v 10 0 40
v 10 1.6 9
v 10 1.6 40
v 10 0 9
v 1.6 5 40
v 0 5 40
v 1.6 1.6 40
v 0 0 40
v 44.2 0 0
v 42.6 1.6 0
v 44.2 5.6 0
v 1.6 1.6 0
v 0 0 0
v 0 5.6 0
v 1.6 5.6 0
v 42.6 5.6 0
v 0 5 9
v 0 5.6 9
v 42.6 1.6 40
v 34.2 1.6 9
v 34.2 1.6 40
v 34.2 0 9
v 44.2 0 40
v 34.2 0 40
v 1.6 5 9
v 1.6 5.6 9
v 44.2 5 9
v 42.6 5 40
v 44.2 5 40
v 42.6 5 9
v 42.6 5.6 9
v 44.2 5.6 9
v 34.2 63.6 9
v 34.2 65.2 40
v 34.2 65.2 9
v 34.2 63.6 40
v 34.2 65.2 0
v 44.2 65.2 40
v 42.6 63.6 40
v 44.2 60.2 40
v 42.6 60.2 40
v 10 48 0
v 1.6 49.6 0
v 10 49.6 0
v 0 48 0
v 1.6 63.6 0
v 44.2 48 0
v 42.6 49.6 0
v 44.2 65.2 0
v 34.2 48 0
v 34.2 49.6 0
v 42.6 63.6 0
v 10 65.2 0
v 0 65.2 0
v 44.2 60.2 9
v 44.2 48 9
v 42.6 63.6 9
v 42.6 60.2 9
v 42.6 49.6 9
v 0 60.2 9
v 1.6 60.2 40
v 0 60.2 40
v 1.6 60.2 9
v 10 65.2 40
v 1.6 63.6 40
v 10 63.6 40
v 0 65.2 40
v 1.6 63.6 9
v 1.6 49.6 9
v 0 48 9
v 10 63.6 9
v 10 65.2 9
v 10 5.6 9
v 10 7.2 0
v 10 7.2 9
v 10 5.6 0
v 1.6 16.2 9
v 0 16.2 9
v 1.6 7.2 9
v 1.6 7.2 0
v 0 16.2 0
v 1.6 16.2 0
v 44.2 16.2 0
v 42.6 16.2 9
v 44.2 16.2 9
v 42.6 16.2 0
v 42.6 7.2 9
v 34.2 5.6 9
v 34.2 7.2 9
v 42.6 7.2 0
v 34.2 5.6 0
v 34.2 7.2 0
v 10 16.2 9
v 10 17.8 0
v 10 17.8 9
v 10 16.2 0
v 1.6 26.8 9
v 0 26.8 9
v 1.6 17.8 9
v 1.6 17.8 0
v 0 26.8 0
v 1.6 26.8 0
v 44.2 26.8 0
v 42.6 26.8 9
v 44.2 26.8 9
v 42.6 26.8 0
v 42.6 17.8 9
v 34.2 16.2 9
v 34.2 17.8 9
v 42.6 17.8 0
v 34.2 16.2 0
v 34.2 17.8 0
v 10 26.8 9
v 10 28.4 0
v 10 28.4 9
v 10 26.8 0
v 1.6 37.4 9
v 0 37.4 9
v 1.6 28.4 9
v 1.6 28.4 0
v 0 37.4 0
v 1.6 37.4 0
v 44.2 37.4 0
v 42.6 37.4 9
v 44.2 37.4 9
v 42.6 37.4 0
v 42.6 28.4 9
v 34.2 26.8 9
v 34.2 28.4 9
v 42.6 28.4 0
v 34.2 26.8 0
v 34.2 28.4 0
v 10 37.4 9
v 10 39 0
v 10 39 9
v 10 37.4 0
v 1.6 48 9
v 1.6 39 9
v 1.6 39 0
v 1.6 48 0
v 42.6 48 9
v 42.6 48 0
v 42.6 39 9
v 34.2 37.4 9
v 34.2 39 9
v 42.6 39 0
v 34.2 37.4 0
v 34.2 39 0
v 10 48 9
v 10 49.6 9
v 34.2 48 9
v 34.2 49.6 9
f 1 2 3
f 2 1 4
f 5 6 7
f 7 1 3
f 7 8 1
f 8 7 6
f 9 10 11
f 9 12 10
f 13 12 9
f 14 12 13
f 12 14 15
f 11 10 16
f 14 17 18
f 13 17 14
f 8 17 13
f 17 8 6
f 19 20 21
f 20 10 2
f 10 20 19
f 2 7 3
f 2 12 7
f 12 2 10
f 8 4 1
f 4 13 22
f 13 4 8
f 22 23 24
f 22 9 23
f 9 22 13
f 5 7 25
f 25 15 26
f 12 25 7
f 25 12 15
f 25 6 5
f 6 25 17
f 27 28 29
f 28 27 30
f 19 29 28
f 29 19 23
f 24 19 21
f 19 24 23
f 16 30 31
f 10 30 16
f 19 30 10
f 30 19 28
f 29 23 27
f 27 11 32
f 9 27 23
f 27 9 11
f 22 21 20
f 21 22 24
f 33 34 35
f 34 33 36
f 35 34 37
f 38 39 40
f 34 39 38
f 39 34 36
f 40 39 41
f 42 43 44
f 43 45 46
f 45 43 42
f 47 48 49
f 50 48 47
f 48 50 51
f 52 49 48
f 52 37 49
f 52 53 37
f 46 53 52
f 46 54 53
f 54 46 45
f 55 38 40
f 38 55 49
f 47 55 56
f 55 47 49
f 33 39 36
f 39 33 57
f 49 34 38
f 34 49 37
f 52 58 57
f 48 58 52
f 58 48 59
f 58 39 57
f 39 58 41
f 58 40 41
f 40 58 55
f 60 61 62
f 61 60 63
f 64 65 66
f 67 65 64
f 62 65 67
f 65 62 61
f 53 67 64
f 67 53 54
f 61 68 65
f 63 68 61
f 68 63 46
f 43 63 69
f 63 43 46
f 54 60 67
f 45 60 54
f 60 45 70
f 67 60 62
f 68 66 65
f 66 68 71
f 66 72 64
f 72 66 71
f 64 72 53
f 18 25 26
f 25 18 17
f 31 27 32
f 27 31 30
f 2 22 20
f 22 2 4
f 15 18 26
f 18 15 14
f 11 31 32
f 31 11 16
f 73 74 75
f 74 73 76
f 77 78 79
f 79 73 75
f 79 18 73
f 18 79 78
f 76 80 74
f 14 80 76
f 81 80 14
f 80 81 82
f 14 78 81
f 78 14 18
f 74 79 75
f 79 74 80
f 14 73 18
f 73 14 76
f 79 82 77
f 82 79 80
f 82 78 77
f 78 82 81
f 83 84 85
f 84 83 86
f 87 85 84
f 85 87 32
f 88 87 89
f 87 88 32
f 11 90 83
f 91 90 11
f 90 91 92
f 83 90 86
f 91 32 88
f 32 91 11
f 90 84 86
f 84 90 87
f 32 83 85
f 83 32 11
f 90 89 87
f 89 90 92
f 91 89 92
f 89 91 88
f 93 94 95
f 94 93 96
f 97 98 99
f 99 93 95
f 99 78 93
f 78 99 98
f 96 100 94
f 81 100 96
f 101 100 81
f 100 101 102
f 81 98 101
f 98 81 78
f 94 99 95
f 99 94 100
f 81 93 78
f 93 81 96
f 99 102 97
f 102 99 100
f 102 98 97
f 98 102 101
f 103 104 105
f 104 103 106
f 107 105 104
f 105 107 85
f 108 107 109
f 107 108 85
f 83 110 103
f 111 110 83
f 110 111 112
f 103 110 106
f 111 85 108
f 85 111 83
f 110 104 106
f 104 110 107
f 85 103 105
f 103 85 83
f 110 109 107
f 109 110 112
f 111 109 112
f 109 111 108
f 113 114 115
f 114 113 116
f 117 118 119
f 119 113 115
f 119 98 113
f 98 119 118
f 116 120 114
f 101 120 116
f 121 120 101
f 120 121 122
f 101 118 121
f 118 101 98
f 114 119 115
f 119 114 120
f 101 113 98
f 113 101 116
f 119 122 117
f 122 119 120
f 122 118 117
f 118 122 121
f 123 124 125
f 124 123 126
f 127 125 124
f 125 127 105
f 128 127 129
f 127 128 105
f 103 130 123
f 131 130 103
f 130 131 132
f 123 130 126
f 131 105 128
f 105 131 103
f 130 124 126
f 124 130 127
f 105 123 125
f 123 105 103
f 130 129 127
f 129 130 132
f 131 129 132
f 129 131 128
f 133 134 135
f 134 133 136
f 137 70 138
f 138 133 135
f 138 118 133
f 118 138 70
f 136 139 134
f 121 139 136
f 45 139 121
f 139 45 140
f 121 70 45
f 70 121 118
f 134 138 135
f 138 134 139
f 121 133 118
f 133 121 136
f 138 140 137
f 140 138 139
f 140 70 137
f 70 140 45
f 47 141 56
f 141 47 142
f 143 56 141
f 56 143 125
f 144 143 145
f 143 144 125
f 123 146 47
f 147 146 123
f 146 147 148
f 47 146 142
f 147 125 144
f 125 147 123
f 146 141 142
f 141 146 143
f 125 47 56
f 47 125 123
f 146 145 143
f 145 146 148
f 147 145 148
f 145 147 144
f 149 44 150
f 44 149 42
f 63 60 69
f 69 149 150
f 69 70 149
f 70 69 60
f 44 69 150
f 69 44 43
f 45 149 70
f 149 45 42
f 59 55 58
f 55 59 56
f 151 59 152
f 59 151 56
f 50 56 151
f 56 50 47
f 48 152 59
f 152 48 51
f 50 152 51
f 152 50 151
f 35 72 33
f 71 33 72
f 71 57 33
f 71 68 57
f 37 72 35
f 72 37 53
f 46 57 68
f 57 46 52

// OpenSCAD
// file: Box Compartment.scad
module box_compartment_corner(width = 15, depth = 15, height = 40, wall_thickness = 1.6) {
  cube(size=[width, wall_thickness, height]);
  cube(size=[wall_thickness, depth, height]);
}

module box_compartment(width = 58, depth = 58, height = 40, wall_thickness = 1.6, cornerSize = [15, 15]) {
  width = width + wall_thickness * 2;
  depth = depth + wall_thickness * 2;
  
  box_compartment_corner(height = height, wall_thickness = wall_thickness, width = cornerSize[0], depth = cornerSize[1]);

  translate([width, 0, 0]) {
    rotate(90, [0, 0, 1]) {
      box_compartment_corner(height = height, wall_thickness = wall_thickness, width = cornerSize[1], depth = cornerSize[0]);
    }

    translate([0, depth, 0]) {
      rotate(180, [0, 0, 1]) {
        box_compartment_corner(height = height, wall_thickness = wall_thickness, width = cornerSize[0], depth = cornerSize[1]);
      }
    }
  }

  translate([0, depth, 0]) {
    rotate(270, [0, 0, 1]) {
      box_compartment_corner(height = height, wall_thickness = wall_thickness, width = cornerSize[1], depth = cornerSize[0]);
    }
  }
}
// main file
use <Box Compartment.scad>

function smallBaseHolderWidth(wall_thickness = 1.6) = 41 + wall_thickness;
function smallBaseHolderDepth(wall_thickness = 1.6) = 9 + wall_thickness;

module small_base_holder(height = 8, wall_thickness = 1.6, depth) {
  width = smallBaseHolderWidth(wall_thickness);
  depth = is_undef(depth) ? smallBaseHolderDepth(wall_thickness) : depth;
  cornerWidth = 10;

  box_compartment_corner(height = height, wall_thickness = wall_thickness, width = cornerWidth, depth = depth);

  translate([width + wall_thickness, 0, 0]) {
    rotate(90, [0, 0, 1]) {
      box_compartment_corner(height = height, wall_thickness = wall_thickness, width = depth, depth = cornerWidth);
    }
  }
}

module small_base_holder_surface(width, depth, wall_thickness = 1.6) {
  holder_width = smallBaseHolderWidth(wall_thickness);
  holder_depth = smallBaseHolderDepth(wall_thickness);
  holder_height = 9;

  endOffset = 5;
  startOffset = holder_depth - endOffset;

  row_count = floor((depth - wall_thickness - endOffset) / holder_depth);
  column_count = floor(width / holder_width);
  
  for(x=[0:1:column_count-1]) {
    translate([holder_width * x, 0, 0]) {
      cube(size=[holder_width + wall_thickness, wall_thickness, holder_height]);

      small_base_holder(holder_height, wall_thickness, startOffset);
    }

    translate([0, startOffset, 0]) {
      for(y=[0:1:row_count-1]) {
        translate([holder_width * x, holder_depth * y, 0]) {
          small_base_holder(
            holder_height, 
            wall_thickness,
            y == row_count - 1 ? holder_depth + endOffset : holder_depth);
        }
      }
    }

    translate([holder_width * x, 0, 0]) {
      translate([0, depth - wall_thickness, 0]) {
        cube(size=[holder_width + wall_thickness, wall_thickness, holder_height]);
      }
    }
  }
}

module large_base_holder_compartment(size = 86, height = 40, wall_thickness = 1.6) {
  box_compartment(size, size, height, wall_thickness);
}

module medium_base_holder_compartment(size = 68, height = 40, wall_thickness = 1.6) {
  box_compartment(size, size, height, wall_thickness);
}

translate([0, 0, -10]) {
  %cube(size=[220-6,220-6, 10]);
}

inner_wall_thickness = 1.6;
rowCount = 6;

compartmentWidth = smallBaseHolderWidth(inner_wall_thickness) + inner_wall_thickness;
compartmentDepth = smallBaseHolderDepth(inner_wall_thickness) * rowCount + inner_wall_thickness;

box_compartment(
  width = compartmentWidth - inner_wall_thickness * 2, 
  depth = compartmentDepth - inner_wall_thickness * 2,
  height = 40,
  cornerSize = [10, 5]);

*cube(size=[compartmentWidth, compartmentDepth, 10]);
translate([0, 0, 0]) {
  small_base_holder_surface(compartmentWidth, compartmentDepth, inner_wall_thickness);
}
